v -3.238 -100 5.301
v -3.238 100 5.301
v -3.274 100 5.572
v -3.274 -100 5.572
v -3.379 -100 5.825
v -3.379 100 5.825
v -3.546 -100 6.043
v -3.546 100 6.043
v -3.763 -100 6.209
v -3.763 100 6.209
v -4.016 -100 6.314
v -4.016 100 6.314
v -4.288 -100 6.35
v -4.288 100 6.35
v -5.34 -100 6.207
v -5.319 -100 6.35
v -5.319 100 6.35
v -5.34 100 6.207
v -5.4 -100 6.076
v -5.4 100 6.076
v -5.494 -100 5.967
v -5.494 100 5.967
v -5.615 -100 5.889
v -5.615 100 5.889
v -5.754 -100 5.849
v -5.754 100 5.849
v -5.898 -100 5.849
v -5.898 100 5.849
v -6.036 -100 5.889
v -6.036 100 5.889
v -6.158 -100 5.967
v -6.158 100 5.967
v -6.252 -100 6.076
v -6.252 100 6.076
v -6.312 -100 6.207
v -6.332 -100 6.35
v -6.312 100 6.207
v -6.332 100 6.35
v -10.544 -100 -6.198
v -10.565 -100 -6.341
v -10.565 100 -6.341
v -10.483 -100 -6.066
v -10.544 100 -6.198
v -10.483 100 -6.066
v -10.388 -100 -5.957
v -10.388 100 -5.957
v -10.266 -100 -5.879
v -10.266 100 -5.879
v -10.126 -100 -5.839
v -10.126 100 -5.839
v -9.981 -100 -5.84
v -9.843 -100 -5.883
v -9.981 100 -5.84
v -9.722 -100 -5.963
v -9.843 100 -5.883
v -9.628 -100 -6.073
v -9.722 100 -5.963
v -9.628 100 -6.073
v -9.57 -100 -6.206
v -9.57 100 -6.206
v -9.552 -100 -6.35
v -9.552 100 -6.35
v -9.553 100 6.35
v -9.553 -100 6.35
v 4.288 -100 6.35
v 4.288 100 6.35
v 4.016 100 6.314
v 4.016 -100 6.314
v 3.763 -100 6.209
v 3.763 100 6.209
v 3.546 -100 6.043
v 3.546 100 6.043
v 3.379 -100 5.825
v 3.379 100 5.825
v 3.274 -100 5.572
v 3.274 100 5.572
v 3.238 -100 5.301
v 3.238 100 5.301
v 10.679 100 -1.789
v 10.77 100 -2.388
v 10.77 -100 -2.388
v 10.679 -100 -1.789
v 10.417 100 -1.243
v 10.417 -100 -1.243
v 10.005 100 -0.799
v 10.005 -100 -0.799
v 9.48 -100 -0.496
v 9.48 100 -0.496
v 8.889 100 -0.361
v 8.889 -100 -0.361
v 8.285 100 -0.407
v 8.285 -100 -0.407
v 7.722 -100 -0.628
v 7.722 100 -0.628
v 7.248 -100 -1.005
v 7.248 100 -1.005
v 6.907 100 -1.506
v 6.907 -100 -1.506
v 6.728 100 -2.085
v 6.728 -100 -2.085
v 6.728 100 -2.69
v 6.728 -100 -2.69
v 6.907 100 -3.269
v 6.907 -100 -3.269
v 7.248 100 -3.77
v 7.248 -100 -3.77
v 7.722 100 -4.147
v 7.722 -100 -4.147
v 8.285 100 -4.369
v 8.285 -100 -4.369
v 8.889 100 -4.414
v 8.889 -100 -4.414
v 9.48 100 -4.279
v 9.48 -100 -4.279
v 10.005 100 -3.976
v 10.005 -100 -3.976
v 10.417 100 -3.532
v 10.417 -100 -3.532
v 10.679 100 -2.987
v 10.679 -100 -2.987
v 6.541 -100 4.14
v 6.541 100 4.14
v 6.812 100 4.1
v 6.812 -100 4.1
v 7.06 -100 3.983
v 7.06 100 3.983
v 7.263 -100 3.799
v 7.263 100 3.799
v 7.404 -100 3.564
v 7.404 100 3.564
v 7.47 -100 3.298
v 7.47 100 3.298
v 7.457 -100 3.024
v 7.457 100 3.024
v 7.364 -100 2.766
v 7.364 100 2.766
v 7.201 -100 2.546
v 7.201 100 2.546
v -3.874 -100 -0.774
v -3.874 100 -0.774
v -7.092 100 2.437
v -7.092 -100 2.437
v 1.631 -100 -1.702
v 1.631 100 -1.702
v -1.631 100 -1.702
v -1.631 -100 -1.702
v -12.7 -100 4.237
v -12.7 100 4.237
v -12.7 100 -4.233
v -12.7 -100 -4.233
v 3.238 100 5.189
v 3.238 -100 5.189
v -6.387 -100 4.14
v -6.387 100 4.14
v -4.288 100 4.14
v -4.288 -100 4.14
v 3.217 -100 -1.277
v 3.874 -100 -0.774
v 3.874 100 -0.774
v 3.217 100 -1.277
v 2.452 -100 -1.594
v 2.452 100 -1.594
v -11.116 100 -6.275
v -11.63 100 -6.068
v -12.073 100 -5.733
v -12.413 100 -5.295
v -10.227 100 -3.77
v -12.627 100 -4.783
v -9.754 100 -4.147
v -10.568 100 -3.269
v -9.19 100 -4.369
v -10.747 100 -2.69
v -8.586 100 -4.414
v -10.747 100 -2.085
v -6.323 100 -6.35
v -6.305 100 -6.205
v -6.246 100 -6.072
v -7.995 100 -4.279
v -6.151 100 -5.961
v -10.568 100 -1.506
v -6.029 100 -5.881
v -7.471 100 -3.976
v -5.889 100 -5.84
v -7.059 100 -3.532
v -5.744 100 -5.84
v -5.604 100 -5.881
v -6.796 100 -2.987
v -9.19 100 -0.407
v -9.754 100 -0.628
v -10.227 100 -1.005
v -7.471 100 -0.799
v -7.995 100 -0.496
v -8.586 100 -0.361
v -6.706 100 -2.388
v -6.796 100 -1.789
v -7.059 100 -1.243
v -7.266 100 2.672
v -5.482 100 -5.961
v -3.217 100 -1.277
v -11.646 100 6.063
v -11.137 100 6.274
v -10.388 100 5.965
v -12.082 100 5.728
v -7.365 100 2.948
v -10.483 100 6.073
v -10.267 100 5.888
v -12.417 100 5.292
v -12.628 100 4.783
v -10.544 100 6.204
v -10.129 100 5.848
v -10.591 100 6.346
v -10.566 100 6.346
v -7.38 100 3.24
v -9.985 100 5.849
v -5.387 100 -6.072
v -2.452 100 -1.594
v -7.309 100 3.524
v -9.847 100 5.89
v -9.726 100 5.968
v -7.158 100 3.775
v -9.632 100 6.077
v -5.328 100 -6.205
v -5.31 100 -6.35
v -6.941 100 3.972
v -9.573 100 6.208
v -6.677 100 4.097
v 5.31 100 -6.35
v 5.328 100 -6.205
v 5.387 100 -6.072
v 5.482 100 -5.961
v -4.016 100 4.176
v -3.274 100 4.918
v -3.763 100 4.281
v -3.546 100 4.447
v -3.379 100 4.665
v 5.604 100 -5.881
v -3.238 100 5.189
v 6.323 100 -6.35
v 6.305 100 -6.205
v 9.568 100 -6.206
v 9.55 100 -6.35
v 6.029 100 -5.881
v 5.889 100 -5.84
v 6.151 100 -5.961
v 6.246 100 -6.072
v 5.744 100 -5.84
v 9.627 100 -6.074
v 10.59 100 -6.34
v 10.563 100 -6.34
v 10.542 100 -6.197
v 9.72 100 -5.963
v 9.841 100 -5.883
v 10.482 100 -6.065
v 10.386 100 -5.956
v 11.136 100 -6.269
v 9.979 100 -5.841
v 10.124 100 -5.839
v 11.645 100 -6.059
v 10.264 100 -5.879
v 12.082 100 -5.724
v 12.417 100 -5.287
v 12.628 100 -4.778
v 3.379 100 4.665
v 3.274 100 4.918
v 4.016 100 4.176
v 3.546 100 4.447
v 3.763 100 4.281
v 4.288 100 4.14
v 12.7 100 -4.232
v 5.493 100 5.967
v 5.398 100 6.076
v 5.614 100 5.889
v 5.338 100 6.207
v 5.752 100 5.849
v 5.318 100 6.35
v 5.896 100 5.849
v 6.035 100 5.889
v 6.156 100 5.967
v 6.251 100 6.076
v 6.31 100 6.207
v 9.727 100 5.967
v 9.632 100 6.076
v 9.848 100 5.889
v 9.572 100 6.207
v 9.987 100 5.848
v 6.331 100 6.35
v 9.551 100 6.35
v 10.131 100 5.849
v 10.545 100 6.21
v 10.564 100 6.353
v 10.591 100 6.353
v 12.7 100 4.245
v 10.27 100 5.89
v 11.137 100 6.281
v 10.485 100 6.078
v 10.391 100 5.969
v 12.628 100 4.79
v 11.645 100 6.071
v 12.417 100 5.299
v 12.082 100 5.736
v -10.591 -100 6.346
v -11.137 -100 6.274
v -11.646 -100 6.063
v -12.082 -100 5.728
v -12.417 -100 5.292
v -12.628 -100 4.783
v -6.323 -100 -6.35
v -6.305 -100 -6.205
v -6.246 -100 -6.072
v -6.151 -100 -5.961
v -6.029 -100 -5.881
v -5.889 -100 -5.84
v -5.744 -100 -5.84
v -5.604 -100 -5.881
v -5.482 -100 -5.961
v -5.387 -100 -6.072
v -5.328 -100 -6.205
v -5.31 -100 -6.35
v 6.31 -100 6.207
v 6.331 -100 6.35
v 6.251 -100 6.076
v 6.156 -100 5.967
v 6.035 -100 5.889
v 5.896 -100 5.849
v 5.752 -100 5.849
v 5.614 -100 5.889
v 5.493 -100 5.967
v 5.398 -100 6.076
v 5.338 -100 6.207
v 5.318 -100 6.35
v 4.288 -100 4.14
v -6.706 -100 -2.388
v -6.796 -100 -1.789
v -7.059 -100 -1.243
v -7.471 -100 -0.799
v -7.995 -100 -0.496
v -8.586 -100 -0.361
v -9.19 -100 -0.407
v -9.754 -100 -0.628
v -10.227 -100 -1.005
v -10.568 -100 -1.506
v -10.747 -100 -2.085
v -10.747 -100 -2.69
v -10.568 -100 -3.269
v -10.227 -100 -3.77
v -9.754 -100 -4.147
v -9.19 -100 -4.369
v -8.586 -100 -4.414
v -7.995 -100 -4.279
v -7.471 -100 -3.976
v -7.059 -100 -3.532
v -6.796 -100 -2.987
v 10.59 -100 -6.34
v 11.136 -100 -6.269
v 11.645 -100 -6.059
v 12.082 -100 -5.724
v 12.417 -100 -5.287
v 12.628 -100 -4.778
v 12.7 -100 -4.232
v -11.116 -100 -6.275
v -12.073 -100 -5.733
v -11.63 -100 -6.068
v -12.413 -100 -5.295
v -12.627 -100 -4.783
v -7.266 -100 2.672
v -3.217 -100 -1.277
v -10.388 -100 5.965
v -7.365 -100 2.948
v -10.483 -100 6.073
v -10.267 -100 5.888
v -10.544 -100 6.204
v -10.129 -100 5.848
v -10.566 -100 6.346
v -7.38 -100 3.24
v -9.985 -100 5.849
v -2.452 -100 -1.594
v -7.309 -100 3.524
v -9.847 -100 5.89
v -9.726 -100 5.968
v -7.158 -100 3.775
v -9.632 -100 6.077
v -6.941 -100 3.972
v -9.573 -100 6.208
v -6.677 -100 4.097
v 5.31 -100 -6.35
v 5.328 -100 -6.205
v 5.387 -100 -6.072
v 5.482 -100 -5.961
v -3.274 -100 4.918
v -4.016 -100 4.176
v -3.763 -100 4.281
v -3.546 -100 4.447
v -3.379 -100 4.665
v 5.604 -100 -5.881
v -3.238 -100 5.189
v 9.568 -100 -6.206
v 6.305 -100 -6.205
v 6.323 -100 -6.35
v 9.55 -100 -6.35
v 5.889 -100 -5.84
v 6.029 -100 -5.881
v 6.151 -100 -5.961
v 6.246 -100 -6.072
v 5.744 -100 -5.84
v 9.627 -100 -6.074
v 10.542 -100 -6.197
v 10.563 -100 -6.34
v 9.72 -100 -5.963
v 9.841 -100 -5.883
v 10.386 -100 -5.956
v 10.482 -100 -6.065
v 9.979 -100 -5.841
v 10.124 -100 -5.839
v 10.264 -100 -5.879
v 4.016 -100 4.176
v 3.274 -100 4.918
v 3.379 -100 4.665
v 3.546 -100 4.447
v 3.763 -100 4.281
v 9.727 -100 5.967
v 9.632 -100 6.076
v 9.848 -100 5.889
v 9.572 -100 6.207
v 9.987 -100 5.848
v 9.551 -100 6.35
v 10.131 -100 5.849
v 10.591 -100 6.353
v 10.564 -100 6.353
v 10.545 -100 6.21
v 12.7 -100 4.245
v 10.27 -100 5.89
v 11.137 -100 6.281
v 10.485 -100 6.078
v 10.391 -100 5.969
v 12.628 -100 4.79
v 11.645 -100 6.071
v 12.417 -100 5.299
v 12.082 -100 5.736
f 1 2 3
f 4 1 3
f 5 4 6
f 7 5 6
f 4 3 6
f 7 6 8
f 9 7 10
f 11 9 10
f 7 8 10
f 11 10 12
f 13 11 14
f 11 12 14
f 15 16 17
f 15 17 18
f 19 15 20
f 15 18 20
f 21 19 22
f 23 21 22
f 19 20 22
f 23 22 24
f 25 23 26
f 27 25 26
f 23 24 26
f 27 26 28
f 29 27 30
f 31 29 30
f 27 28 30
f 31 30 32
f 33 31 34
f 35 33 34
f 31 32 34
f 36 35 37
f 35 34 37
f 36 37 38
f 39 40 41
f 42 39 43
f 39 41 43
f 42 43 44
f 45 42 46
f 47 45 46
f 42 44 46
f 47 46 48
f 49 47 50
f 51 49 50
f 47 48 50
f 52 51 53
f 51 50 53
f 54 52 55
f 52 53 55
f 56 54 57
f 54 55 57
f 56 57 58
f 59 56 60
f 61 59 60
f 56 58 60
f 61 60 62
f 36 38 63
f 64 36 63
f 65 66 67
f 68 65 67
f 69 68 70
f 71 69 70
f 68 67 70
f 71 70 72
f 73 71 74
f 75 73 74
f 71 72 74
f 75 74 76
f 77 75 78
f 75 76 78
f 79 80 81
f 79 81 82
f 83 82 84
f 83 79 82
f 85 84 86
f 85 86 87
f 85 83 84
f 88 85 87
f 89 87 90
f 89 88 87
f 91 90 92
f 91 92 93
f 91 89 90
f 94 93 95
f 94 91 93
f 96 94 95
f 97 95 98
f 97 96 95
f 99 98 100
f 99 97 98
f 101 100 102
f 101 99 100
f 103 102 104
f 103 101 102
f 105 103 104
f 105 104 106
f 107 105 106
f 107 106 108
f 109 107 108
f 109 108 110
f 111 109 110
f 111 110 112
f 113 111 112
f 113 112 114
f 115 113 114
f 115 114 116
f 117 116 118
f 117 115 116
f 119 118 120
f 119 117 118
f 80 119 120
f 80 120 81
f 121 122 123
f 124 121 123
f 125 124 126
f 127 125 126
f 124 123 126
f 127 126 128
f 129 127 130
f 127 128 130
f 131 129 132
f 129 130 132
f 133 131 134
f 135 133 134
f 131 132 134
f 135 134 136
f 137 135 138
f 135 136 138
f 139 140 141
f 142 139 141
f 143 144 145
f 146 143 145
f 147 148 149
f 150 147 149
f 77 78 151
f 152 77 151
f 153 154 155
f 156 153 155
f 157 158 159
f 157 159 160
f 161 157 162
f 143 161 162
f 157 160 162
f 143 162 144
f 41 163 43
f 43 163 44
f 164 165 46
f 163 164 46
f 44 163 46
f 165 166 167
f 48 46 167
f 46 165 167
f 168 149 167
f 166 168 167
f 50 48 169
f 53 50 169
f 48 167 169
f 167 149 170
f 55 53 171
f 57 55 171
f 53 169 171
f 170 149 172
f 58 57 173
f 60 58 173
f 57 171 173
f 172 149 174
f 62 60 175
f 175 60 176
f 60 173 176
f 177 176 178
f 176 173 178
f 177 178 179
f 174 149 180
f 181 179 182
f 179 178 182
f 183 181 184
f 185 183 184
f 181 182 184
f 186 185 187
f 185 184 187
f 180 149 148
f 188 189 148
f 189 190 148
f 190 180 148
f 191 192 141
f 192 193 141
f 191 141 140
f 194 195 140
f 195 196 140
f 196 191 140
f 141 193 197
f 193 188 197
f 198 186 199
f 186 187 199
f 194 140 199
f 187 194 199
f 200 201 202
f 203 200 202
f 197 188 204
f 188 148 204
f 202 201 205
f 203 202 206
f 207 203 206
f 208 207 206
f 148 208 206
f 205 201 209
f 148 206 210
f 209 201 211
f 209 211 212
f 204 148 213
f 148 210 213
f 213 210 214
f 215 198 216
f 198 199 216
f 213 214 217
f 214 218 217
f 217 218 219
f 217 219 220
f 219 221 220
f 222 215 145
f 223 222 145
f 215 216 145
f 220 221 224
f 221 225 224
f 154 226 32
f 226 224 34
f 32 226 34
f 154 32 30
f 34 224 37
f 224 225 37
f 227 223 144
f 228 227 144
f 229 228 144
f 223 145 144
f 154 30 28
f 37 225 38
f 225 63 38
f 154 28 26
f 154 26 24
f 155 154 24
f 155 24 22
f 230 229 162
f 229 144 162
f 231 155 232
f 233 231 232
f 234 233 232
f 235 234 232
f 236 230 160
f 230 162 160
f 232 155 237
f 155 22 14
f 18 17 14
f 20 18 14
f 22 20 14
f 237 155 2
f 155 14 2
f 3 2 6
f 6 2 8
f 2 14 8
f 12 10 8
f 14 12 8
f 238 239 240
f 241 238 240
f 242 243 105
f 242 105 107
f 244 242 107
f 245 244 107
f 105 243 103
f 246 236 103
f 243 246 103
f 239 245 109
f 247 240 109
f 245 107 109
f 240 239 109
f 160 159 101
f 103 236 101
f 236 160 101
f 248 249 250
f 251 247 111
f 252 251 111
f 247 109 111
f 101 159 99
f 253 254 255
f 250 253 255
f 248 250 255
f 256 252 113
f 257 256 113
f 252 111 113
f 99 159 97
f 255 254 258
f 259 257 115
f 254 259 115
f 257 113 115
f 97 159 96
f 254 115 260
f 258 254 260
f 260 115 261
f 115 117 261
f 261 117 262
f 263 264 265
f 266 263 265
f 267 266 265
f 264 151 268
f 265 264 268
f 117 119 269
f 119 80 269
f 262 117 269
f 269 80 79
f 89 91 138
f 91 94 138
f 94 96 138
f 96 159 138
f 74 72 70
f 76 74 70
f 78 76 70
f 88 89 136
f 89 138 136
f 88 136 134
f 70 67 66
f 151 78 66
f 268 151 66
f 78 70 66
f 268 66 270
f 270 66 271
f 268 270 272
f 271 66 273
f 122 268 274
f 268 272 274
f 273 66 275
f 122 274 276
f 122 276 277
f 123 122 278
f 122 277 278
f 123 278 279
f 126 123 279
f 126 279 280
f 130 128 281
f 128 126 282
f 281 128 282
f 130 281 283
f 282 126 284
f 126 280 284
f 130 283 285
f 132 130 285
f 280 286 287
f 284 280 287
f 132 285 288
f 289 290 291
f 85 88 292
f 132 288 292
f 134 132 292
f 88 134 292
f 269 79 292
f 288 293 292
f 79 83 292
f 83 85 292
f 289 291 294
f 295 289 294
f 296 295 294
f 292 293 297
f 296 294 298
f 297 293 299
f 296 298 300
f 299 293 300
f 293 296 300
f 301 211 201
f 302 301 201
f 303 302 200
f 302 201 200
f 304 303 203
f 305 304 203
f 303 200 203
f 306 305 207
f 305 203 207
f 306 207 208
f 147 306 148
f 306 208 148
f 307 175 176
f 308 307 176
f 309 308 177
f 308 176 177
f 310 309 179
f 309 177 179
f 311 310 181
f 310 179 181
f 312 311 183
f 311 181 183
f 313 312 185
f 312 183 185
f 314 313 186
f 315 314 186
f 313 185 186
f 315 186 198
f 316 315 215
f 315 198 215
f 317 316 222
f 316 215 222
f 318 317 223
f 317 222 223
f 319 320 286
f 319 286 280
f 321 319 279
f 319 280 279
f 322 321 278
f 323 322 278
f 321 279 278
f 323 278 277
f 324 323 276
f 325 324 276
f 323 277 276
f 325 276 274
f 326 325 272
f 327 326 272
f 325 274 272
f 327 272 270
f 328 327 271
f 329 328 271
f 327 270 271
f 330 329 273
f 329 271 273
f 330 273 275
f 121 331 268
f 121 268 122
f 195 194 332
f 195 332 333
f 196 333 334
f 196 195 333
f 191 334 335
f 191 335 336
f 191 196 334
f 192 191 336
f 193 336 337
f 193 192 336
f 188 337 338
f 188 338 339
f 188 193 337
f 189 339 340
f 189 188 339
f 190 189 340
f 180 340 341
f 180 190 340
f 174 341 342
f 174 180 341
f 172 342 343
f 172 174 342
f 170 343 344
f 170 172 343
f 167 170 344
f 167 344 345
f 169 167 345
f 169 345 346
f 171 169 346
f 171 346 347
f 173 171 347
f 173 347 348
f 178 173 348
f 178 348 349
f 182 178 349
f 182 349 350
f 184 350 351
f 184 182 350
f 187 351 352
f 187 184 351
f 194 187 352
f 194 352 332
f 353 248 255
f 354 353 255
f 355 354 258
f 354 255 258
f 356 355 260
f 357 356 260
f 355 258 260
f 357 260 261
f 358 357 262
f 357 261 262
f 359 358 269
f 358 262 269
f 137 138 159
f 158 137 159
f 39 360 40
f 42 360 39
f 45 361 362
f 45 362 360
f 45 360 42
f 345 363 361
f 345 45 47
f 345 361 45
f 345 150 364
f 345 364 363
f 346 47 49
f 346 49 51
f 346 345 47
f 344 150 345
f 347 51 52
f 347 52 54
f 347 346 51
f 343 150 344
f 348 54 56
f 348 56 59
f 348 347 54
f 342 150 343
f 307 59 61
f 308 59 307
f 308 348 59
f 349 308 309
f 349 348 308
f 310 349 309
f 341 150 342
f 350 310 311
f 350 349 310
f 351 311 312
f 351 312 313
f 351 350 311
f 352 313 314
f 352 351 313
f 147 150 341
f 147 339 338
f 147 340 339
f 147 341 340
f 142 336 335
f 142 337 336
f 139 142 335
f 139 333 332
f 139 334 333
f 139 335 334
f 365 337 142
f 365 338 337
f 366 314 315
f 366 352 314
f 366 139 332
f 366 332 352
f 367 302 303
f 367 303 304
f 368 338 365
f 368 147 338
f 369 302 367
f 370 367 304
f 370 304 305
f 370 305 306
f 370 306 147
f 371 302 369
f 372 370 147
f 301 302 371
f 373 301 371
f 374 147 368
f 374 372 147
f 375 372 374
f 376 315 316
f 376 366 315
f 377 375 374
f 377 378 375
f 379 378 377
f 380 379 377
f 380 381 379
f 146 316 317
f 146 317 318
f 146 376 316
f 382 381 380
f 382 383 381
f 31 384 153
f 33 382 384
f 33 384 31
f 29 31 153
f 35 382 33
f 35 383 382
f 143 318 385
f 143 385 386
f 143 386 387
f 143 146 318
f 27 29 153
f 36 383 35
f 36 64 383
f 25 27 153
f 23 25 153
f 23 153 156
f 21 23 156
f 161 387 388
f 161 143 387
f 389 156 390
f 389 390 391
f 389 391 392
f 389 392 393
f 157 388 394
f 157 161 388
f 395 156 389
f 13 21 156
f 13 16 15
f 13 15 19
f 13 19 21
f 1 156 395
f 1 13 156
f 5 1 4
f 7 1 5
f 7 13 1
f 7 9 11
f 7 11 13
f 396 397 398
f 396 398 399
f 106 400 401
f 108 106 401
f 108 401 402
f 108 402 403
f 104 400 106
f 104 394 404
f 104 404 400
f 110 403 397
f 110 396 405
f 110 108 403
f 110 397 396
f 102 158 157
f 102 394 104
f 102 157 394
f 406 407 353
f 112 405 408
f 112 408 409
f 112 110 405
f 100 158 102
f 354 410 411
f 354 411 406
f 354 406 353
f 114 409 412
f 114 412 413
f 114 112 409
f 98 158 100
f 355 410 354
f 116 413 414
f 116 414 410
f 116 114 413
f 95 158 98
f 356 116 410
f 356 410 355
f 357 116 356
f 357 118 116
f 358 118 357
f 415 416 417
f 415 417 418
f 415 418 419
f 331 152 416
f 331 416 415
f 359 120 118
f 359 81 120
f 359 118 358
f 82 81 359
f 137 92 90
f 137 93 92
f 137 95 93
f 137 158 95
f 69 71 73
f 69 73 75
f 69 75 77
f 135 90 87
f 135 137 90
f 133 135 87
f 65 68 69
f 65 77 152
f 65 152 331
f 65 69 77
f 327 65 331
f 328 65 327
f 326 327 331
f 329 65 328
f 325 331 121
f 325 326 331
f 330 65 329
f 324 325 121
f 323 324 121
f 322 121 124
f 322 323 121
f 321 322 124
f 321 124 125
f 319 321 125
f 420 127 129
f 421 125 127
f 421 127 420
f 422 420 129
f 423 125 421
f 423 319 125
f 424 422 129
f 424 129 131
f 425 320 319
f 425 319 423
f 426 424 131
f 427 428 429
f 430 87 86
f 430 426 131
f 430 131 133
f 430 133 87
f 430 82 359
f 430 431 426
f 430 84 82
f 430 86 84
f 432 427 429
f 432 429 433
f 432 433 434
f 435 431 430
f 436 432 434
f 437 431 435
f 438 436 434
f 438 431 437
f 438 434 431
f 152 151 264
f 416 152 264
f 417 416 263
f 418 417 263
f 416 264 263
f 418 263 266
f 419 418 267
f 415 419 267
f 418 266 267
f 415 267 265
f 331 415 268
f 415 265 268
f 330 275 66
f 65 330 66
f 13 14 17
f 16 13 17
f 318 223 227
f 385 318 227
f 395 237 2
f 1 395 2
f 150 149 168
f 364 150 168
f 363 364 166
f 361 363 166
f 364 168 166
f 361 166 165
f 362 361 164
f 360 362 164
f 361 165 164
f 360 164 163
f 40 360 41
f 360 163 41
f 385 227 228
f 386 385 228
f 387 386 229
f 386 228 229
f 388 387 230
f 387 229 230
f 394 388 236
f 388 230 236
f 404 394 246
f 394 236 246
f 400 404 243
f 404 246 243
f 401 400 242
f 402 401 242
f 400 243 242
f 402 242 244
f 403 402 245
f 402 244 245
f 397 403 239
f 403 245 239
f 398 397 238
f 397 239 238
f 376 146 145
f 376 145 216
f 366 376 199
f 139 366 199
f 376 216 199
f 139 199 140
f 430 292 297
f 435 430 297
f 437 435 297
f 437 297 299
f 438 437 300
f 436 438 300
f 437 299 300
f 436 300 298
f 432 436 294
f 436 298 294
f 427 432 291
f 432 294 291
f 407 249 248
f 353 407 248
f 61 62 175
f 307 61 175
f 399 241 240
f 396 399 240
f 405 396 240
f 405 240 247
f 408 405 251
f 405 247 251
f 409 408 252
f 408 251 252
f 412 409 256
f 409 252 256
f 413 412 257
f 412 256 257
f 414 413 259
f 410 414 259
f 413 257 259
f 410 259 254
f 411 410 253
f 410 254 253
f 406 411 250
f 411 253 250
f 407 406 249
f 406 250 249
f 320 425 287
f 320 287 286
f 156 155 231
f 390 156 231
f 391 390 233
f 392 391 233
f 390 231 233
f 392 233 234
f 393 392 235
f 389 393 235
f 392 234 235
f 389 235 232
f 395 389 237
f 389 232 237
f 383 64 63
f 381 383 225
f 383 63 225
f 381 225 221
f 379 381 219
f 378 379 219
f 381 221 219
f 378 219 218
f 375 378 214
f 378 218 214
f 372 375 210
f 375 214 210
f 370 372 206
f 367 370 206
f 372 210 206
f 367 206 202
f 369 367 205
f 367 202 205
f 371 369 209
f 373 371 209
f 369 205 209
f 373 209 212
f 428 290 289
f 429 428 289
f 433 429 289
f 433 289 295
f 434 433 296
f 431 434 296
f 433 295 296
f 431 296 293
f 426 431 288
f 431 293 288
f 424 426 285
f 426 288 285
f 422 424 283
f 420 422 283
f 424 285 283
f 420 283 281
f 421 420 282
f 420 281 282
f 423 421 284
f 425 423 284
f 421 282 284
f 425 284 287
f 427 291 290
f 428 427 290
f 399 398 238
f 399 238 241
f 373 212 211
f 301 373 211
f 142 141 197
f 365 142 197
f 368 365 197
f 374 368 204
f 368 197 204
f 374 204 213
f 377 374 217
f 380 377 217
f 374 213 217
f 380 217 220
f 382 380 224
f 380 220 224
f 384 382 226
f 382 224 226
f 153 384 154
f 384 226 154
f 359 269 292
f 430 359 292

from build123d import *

# Parameters (mm, degrees)
SKETCH18_R                = 2.032
F_10_1050_PROFILE_1_DEPTH = 200


with BuildPart() as part:
    # Sketch18 → 10 1050 PROFILE(1) (new body)
    with BuildSketch(Plane.XZ.offset(-100)):
        with BuildLine():
            Line((9.551093887, 6.35), (6.330982008, 6.35))
            ThreePointArc((6.330982008, 6.35), (5.824379679, 5.843397671), (5.31777735, 6.35))
            Line((5.31777735, 6.35), (4.28752, 6.35))
            ThreePointArc((4.28752, 6.35), (3.545750844, 6.042749156), (3.2385, 5.30098))
            Line((3.2385, 5.30098), (3.2385, 5.18922))
            ThreePointArc((3.2385, 5.18922), (3.545750844, 4.447450844), (4.28752, 4.1402))
            Line((4.28752, 4.1402), (6.541264932, 4.1402))
            ThreePointArc((6.541264932, 4.1402), (7.403778411, 3.563601238), (7.200674335, 2.54618079))
            Line((7.200674335, 2.54618079), (3.874487735, -0.773919123))
            ThreePointArc((3.874487735, -0.773919123), (2.845157282, -1.460673567), (1.631480681, -1.7018))
            Line((1.631480681, -1.7018), (-1.631480681, -1.7018))
            ThreePointArc((-1.631480681, -1.7018), (-2.845157282, -1.460673567), (-3.874487735, -0.773919123))
            Line((-3.874487735, -0.773919123), (-7.091634343, 2.437340333))
            ThreePointArc((-7.091634343, 2.437340333), (-7.30860647, 3.524230776), (-6.387200124, 4.1402))
            Line((-6.387200124, 4.1402), (-4.28752, 4.1402))
            ThreePointArc((-4.28752, 4.1402), (-3.545750844, 4.447450844), (-3.2385, 5.18922))
            Line((-3.2385, 5.18922), (-3.2385, 5.30098))
            ThreePointArc((-3.2385, 5.30098), (-3.545750844, 6.042749156), (-4.28752, 6.35))
            Line((-4.28752, 6.35), (-5.319235427, 6.35))
            ThreePointArc((-5.319235427, 6.35), (-5.825837756, 5.843397671), (-6.332440085, 6.35))
            Line((-6.332440085, 6.35), (-9.552501021, 6.35))
            ThreePointArc((-9.552501021, 6.35), (-10.056951984, 5.843402239), (-10.565687406, 6.345697309))
            Line((-10.565687406, 6.345697309), (-10.591304516, 6.345701455))
            ThreePointArc((-10.591304516, 6.345701455), (-12.082359481, 5.728298321), (-12.7, 4.237343309))
            Line((-12.7, 4.237343309), (-12.7, -4.233074923))
            ThreePointArc((-12.7, -4.233074923), (-12.072915167, -5.733409532), (-10.564685825, -6.341261141))
            ThreePointArc((-10.564685825, -6.341261141), (-10.053713904, -5.834598435), (-9.551557924, -6.35))
            Line((-9.551557924, -6.35), (-6.323021107, -6.35))
            ThreePointArc((-6.323021107, -6.35), (-5.816495529, -5.83457959), (-5.309969951, -6.35))
            Line((-5.309969951, -6.35), (5.309969951, -6.35))
            ThreePointArc((5.309969951, -6.35), (5.816495529, -5.83457959), (6.323021107, -6.35))
            Line((6.323021107, -6.35), (9.550160942, -6.35))
            ThreePointArc((9.550160942, -6.35), (10.051855758, -5.834602622), (10.563288148, -6.340338775))
            Line((10.563288148, -6.340338775), (10.589922543, -6.34049468))
            ThreePointArc((10.589922543, -6.34049468), (12.081868228, -5.723579066), (12.7, -4.23213684))
            Line((12.7, -4.23213684), (12.7, 4.244714967))
            ThreePointArc((12.7, 4.244714967), (12.082266163, 5.735759476), (10.591047766, 6.353073372))
            Line((10.591047766, 6.353073372), (10.564289268, 6.353065837))
            ThreePointArc((10.564289268, 6.353065837), (10.059229141, 5.84339999), (9.551093887, 6.35))
        make_face()
        with Locations((-8.7376, -2.3876)):
            Circle(SKETCH18_R, mode=Mode.SUBTRACT)
        with Locations((8.7376, -2.3876)):
            Circle(SKETCH18_R, mode=Mode.SUBTRACT)
    extrude(amount=F_10_1050_PROFILE_1_DEPTH)


solid = part.part
